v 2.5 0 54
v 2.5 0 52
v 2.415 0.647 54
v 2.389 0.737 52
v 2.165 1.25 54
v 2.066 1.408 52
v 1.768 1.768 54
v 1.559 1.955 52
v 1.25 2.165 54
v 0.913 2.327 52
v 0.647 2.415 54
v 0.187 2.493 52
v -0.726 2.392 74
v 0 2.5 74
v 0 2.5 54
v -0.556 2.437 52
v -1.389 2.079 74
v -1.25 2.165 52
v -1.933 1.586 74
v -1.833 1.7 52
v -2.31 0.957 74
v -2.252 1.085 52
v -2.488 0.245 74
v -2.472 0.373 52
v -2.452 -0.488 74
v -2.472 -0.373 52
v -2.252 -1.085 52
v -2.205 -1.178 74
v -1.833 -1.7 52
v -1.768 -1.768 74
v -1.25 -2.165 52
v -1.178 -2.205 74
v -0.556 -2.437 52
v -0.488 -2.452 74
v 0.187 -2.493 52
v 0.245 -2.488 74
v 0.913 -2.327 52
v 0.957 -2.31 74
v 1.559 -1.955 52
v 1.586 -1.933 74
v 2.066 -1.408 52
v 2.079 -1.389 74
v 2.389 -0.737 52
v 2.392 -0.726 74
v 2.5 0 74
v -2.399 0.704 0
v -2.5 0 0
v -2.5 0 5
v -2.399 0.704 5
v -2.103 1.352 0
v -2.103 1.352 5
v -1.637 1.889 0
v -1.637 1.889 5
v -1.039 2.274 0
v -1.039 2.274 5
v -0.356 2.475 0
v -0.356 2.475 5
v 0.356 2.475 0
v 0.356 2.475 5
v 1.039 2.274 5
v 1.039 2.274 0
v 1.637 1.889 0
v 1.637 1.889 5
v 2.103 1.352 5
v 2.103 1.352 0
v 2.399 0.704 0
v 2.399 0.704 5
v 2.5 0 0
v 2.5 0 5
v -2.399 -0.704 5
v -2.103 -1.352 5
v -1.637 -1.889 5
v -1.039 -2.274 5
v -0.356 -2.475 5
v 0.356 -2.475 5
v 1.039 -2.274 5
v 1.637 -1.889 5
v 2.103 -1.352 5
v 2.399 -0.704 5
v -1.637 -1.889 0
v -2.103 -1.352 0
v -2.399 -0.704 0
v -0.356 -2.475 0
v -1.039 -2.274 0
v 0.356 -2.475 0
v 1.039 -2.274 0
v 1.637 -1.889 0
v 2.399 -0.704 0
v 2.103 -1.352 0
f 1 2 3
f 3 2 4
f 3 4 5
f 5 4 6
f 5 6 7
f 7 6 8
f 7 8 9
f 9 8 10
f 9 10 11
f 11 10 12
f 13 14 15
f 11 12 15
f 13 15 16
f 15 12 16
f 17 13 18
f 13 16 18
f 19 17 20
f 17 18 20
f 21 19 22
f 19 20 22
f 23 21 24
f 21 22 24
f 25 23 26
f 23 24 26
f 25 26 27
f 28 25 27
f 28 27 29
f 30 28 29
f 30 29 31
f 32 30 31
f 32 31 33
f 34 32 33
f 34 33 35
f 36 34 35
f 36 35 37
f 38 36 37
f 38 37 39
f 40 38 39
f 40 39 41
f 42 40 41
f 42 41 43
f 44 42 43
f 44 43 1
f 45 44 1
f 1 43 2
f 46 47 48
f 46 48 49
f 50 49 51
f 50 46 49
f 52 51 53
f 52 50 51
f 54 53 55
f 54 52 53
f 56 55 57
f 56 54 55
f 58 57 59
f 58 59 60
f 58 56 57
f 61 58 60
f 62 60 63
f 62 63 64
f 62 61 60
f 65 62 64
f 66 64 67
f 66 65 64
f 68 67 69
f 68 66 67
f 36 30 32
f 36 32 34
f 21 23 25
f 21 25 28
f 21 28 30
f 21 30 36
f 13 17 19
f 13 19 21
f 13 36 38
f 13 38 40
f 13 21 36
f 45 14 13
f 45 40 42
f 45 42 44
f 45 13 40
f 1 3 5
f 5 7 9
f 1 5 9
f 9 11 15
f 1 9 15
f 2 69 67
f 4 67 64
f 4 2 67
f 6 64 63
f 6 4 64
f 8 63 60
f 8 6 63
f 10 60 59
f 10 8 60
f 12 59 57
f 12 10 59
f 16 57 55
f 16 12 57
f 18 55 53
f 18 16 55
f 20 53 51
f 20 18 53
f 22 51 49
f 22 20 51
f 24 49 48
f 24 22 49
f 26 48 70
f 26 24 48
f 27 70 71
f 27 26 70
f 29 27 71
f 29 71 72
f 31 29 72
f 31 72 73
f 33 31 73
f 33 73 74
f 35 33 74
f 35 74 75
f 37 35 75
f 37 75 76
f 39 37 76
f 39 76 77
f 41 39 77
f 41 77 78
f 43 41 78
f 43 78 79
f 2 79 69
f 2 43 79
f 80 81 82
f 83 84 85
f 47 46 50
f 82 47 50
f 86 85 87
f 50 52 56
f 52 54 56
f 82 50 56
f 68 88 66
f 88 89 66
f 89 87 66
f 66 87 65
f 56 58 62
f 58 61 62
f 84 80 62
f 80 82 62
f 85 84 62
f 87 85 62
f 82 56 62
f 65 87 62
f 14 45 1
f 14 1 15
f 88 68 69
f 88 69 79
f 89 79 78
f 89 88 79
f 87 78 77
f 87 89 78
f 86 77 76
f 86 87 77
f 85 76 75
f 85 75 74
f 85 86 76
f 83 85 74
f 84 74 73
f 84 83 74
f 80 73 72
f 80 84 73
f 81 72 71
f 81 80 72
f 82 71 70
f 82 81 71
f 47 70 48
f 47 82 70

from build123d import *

# Parameters (mm, degrees)
SKETCH1_W                = 42.3
SKETCH1_H                = 42.3
BOSS_EXTRUDE1_DEPTH      = 50
SKETCH2_R                = 11
BOSS_EXTRUDE2_DEPTH      = 2
SKETCH3_R                = 1.75
CUT_EXTRUDE1_DEPTH       = 51
CUT_EXTRUDE2_DEPTH       = 51
SKETCH5_R                = 2.5
CUT_EXTRUDE3_DEPTH       = 53
SKETCH6_R                = 2.5
BOSS_EXTRUDE3_DEPTH      = 22
BOSS_EXTRUDE3_DEPTH_BACK = 52
SKETCH7_R                = 5
SKETCH7_R_2              = 2.5
CUT_EXTRUDE4_DEPTH       = 5
CUT_EXTRUDE5_DEPTH       = 20
SKETCH9_OUTSIDE_W        = 63.332
SKETCH9_OUTSIDE_H        = 63.332
SKETCH9_OUTSIDE_R        = 2.5
CUT_EXTRUDE6_DEPTH       = 75


with BuildPart() as part:
    # Sketch1 → Boss-Extrude1 (new body)
    with BuildSketch(Plane.XY):
        Rectangle(SKETCH1_W, SKETCH1_H)
    extrude(amount=BOSS_EXTRUDE1_DEPTH)

    # Sketch2 → Boss-Extrude2 (add)
    with BuildSketch(Plane.XY.offset(50)):
        Circle(SKETCH2_R)
    extrude(amount=BOSS_EXTRUDE2_DEPTH)

    # Sketch3 → Cut-Extrude1 (cut, through all)
    with BuildSketch(Plane.XY.offset(50)):
        with Locations((-16.55, 16.55)):
            Circle(SKETCH3_R)
        with Locations((16.55, 16.55)):
            Circle(SKETCH3_R)
        with Locations((16.55, -16.55)):
            Circle(SKETCH3_R)
        with Locations((-16.55, -16.55)):
            Circle(SKETCH3_R)
    extrude(amount=-CUT_EXTRUDE1_DEPTH, mode=Mode.SUBTRACT)

    # Sketch4 → Cut-Extrude2 (cut, through all)
    with BuildSketch(Plane.XY.offset(50)):
        Polygon((-21.15, 17.897308807), (-21.15, 21.15), (-17.897308807, 21.15), align=None)
        Polygon((17.897308807, 21.15), (21.15, 21.15), (21.15, 17.897308807), align=None)
        Polygon((21.15, -17.897308807), (21.15, -21.15), (17.897308807, -21.15), align=None)
        Polygon((-17.897308807, -21.15), (-21.15, -21.15), (-21.15, -17.897308807), align=None)
    extrude(amount=-CUT_EXTRUDE2_DEPTH, mode=Mode.SUBTRACT)

    # Sketch5 → Cut-Extrude3 (cut, through all)
    with BuildSketch(Plane.XY.offset(52)):
        Circle(SKETCH5_R)
    extrude(amount=-CUT_EXTRUDE3_DEPTH, mode=Mode.SUBTRACT)

    # Sketch6 → Boss-Extrude3 (add, two sides)
    with BuildSketch(Plane.XY.offset(52)) as boss_extrude3_sk:
        Circle(SKETCH6_R)
    extrude(amount=BOSS_EXTRUDE3_DEPTH)
    extrude(boss_extrude3_sk.sketch, amount=-BOSS_EXTRUDE3_DEPTH_BACK)

    # Sketch7 → Cut-Extrude4 (cut)
    with BuildSketch(Plane(origin=(0, 0, 0), x_dir=(-1, 0, 0), z_dir=(0, 0, -1))):
        Circle(SKETCH7_R)
        Circle(SKETCH7_R_2, mode=Mode.SUBTRACT)
    extrude(amount=-CUT_EXTRUDE4_DEPTH, mode=Mode.SUBTRACT)

    # Sketch8 → Cut-Extrude5 (cut)
    with BuildSketch(Plane.XY.offset(74)):
        with BuildLine():
            Line((2.5, 0), (0, 2.5))
            ThreePointArc((0, 2.5), (1.767766953, 1.767766953), (2.5, 0))
        make_face()
    extrude(amount=-CUT_EXTRUDE5_DEPTH, mode=Mode.SUBTRACT)

    # Sketch9 outside → Cut-Extrude6 (cut, through all)
    with BuildSketch(Plane.XY.offset(74)):
        Rectangle(SKETCH9_OUTSIDE_W, SKETCH9_OUTSIDE_H)
        Circle(SKETCH9_OUTSIDE_R, mode=Mode.SUBTRACT)
    extrude(amount=-CUT_EXTRUDE6_DEPTH, mode=Mode.SUBTRACT)


solid = part.part
